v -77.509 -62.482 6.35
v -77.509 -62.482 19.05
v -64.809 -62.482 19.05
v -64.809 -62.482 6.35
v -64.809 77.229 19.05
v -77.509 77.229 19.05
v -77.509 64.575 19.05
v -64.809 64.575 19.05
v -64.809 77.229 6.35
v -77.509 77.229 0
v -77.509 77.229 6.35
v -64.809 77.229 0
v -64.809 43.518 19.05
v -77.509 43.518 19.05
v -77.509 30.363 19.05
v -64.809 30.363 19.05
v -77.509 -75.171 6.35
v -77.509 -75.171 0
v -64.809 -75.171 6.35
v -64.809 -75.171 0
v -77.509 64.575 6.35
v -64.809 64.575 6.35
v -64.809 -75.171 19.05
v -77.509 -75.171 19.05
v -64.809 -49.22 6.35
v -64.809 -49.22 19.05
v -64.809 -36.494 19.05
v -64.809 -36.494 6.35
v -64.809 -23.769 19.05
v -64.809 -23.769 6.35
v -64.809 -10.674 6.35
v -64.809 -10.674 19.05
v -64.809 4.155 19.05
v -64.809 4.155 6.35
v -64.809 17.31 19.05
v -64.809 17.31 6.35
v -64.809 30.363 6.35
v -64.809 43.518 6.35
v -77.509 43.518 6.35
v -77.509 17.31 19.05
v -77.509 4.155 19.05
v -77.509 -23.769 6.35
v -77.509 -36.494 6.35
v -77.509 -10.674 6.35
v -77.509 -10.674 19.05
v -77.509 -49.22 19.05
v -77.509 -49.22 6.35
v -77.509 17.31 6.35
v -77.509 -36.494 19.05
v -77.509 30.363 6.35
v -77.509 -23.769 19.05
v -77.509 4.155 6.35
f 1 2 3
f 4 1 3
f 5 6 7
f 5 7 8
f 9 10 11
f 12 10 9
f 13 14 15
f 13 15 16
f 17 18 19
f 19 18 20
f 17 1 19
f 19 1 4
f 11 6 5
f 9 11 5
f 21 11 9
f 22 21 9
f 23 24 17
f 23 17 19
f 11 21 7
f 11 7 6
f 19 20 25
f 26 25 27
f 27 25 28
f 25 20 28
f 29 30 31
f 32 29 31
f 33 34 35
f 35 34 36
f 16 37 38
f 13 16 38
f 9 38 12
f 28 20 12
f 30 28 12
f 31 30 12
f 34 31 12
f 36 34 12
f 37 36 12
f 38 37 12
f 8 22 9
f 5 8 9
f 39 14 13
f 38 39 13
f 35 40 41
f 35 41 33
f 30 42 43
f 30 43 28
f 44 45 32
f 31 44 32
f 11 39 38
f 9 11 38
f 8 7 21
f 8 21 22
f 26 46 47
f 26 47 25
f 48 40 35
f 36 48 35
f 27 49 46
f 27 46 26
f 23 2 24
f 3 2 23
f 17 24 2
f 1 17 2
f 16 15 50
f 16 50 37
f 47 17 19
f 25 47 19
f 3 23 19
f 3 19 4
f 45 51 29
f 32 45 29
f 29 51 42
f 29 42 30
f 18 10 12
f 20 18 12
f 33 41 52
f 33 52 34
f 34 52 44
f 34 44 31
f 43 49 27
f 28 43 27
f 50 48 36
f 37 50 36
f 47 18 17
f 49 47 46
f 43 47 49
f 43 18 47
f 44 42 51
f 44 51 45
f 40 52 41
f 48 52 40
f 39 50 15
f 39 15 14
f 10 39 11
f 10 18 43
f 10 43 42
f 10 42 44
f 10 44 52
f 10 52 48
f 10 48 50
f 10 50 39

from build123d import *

# Parameters (mm, degrees)
F0_W     = 12.7
F0_H     = 152.4
F1_DEPTH = 6.35
F2_W     = 12.7115957439
F2_H     = 12.6547422051
F3_DEPTH = 12.7
F2_W_2   = 12.751204893
F2_W_3   = 12.7115929499
F2_W_4   = 12.6353409141
F2_W_5   = 12.5799756497
F2_W_6   = 12.2375227511
F2_W_7   = 12.5007666647
F2_W_8   = 12.7
F4_W     = 12.3231597245
F4_H     = 12.6880295575
F5_DEPTH = 12.7
F4_W_2   = 12.9681192338
F4_W_3   = 12.7036152408
F4_W_4   = 12.8452572972
F4_W_5   = 13.1434928626
F4_W_6   = 12.528244406
F4_W_7   = 11.9724087417
F4_W_8   = 12.7
F6_W     = 12.7
F6_H     = 13.0946394056
F6_H_2   = 13.1554147229
F6_H_3   = 13.1554119289
F6_H_4   = 12.7253122628
F7_DEPTH = 12.7


with BuildPart() as f1:
    # F0 (on Top) → F1 (new body)
    with BuildSketch(Plane.XY):
        with Locations((-71.159024334, 1.0294830322)):
            Rectangle(F0_W, F0_H)
    extrude(amount=F1_DEPTH)

    # F6 (on face) → F7 (join)
    with BuildSketch(Plane.XY.offset(6.35)):
        with Locations((-71.159024334, -17.2217907384)):
            Rectangle(F6_W, F6_H)
        with Locations((-71.159024334, 10.7322898693)):
            Rectangle(F6_W, F6_H_2)
        with Locations((-71.159024334, 36.9402673095)):
            Rectangle(F6_W, F6_H_3)
        with Locations((-71.159024334, -42.8570825607)):
            Rectangle(F6_W, F6_H_4)
    extrude(amount=F7_DEPTH)


with BuildPart() as f1b:
    # F0 (on Top) → F1, piece 2 (new body)
    with BuildSketch(Plane.XY):
        with Locations((-51.1211747468, 1.0294830322)):
            Rectangle(F0_W, F0_H)
    extrude(amount=F1_DEPTH)


with BuildPart() as f1c:
    # F0 (on Top) → F1, piece 3 (new body)
    with BuildSketch(Plane.XY):
        with Locations((-32.7470557928, 1.0294830322)):
            Rectangle(F0_W, F0_H)
    extrude(amount=F1_DEPTH)


with BuildPart() as f1d:
    # F0 (on Top) → F1, piece 4 (new body)
    with BuildSketch(Plane.XY):
        with Locations((-16.4686223328, 1.0294830322)):
            Rectangle(F0_W, F0_H)
    extrude(amount=F1_DEPTH)


with BuildPart() as f1e:
    # F0 (on Top) → F1, piece 5 (new body)
    with BuildSketch(Plane.XY):
        with Locations((6.35, 1.0294830322)):
            Rectangle(F0_W, F0_H)
    extrude(amount=F1_DEPTH)


with BuildPart() as f1f:
    # F0 (on Top) → F1, piece 6 (new body)
    with BuildSketch(Plane.XY):
        with Locations((25.6913216621, 1.0294830322)):
            Rectangle(F0_W, F0_H)
    extrude(amount=F1_DEPTH)


with BuildPart() as f1g:
    # F0 (on Top) → F1, piece 7 (new body)
    with BuildSketch(Plane.XY):
        with Locations((46.5542903006, 1.0294830322)):
            Rectangle(F0_W, F0_H)
    extrude(amount=F1_DEPTH)


with BuildPart() as f1h:
    # F0 (on Top) → F1, piece 8 (new body)
    with BuildSketch(Plane.XY):
        with Locations((68.2591391563, 1.0294830322)):
            Rectangle(F0_W, F0_H)
    extrude(amount=F1_DEPTH)


with BuildPart() as f3:
    # F2 (on face) → F3 (new body)
    with BuildSketch(Plane.XY.offset(6.35)):
        with Locations((-50.8954767138, 70.9021119297)):
            Rectangle(F2_W, F2_H)
    extrude(amount=F3_DEPTH)


with BuildPart() as f3b:
    # F2 (on face) → F3, piece 2 (new body)
    with BuildSketch(Plane.XY.offset(6.35)):
        with Locations((-32.5111793354, 70.9021119297)):
            Rectangle(F2_W_2, F2_H)
    extrude(amount=F3_DEPTH)


with BuildPart() as f3c:
    # F2 (on face) → F3, piece 3 (new body)
    with BuildSketch(Plane.XY.offset(6.35)):
        with Locations((-16.0371768288, 70.9021119297)):
            Rectangle(F2_W_3, F2_H)
    extrude(amount=F3_DEPTH)


with BuildPart() as f3d:
    # F2 (on face) → F3, piece 4 (new body)
    with BuildSketch(Plane.XY.offset(6.35)):
        with Locations((6.3176704571, 70.9021119297)):
            Rectangle(F2_W_4, F2_H)
    extrude(amount=F3_DEPTH)


with BuildPart() as f3e:
    # F2 (on face) → F3, piece 5 (new body)
    with BuildSketch(Plane.XY.offset(6.35)):
        with Locations((26.2380959466, 70.9021119297)):
            Rectangle(F2_W_5, F2_H)
    extrude(amount=F3_DEPTH)


with BuildPart() as f3f:
    # F2 (on face) → F3, piece 6 (new body)
    with BuildSketch(Plane.XY.offset(6.35)):
        with Locations((47.2374055535, 70.9021119297)):
            Rectangle(F2_W_6, F2_H)
    extrude(amount=F3_DEPTH)


with BuildPart() as f3g:
    # F2 (on face) → F3, piece 7 (new body)
    with BuildSketch(Plane.XY.offset(6.35)):
        with Locations((68.3683436364, 70.9021119297)):
            Rectangle(F2_W_7, F2_H)
    extrude(amount=F3_DEPTH)


with BuildPart() as f3h:
    # F2 (on face) → F3, piece 8 (new body)
    with BuildSketch(Plane.XY.offset(6.35)):
        with Locations((-71.159024334, 70.9021119297)):
            Rectangle(F2_W_8, F2_H)
    extrude(amount=F3_DEPTH)


with BuildPart() as f5:
    # F4 (on face) → F5 (new body)
    with BuildSketch(Plane.XY.offset(6.35)):
        with Locations((-51.4552425593, -68.826502189)):
            Rectangle(F4_W, F4_H)
    extrude(amount=F5_DEPTH)


with BuildPart() as f5b:
    # F4 (on face) → F5, piece 2 (new body)
    with BuildSketch(Plane.XY.offset(6.35)):
        with Locations((-32.7577721328, -68.826502189)):
            Rectangle(F4_W_2, F4_H)
    extrude(amount=F5_DEPTH)


with BuildPart() as f5c:
    # F4 (on face) → F5, piece 3 (new body)
    with BuildSketch(Plane.XY.offset(6.35)):
        with Locations((-16.3876046427, -68.826502189)):
            Rectangle(F4_W_3, F4_H)
    extrude(amount=F5_DEPTH)


with BuildPart() as f5d:
    # F4 (on face) → F5, piece 4 (new body)
    with BuildSketch(Plane.XY.offset(6.35)):
        with Locations((6.4226286486, -68.826502189)):
            Rectangle(F4_W_4, F4_H)
    extrude(amount=F5_DEPTH)


with BuildPart() as f5e:
    # F4 (on face) → F5, piece 5 (new body)
    with BuildSketch(Plane.XY.offset(6.35)):
        with Locations((25.6442101672, -68.826502189)):
            Rectangle(F4_W_5, F4_H)
    extrude(amount=F5_DEPTH)


with BuildPart() as f5f:
    # F4 (on face) → F5, piece 6 (new body)
    with BuildSketch(Plane.XY.offset(6.35)):
        with Locations((46.3153552264, -68.826502189)):
            Rectangle(F4_W_6, F4_H)
    extrude(amount=F5_DEPTH)


with BuildPart() as f5g:
    # F4 (on face) → F5, piece 7 (new body)
    with BuildSketch(Plane.XY.offset(6.35)):
        with Locations((68.3626625687, -68.826502189)):
            Rectangle(F4_W_7, F4_H)
    extrude(amount=F5_DEPTH)


with BuildPart() as f5h:
    # F4 (on face) → F5, piece 8 (new body)
    with BuildSketch(Plane.XY.offset(6.35)):
        with Locations((-71.159024334, -68.826502189)):
            Rectangle(F4_W_8, F4_H)
    extrude(amount=F5_DEPTH)


solid = Compound([f1.part, f3h.part, f5h.part])
